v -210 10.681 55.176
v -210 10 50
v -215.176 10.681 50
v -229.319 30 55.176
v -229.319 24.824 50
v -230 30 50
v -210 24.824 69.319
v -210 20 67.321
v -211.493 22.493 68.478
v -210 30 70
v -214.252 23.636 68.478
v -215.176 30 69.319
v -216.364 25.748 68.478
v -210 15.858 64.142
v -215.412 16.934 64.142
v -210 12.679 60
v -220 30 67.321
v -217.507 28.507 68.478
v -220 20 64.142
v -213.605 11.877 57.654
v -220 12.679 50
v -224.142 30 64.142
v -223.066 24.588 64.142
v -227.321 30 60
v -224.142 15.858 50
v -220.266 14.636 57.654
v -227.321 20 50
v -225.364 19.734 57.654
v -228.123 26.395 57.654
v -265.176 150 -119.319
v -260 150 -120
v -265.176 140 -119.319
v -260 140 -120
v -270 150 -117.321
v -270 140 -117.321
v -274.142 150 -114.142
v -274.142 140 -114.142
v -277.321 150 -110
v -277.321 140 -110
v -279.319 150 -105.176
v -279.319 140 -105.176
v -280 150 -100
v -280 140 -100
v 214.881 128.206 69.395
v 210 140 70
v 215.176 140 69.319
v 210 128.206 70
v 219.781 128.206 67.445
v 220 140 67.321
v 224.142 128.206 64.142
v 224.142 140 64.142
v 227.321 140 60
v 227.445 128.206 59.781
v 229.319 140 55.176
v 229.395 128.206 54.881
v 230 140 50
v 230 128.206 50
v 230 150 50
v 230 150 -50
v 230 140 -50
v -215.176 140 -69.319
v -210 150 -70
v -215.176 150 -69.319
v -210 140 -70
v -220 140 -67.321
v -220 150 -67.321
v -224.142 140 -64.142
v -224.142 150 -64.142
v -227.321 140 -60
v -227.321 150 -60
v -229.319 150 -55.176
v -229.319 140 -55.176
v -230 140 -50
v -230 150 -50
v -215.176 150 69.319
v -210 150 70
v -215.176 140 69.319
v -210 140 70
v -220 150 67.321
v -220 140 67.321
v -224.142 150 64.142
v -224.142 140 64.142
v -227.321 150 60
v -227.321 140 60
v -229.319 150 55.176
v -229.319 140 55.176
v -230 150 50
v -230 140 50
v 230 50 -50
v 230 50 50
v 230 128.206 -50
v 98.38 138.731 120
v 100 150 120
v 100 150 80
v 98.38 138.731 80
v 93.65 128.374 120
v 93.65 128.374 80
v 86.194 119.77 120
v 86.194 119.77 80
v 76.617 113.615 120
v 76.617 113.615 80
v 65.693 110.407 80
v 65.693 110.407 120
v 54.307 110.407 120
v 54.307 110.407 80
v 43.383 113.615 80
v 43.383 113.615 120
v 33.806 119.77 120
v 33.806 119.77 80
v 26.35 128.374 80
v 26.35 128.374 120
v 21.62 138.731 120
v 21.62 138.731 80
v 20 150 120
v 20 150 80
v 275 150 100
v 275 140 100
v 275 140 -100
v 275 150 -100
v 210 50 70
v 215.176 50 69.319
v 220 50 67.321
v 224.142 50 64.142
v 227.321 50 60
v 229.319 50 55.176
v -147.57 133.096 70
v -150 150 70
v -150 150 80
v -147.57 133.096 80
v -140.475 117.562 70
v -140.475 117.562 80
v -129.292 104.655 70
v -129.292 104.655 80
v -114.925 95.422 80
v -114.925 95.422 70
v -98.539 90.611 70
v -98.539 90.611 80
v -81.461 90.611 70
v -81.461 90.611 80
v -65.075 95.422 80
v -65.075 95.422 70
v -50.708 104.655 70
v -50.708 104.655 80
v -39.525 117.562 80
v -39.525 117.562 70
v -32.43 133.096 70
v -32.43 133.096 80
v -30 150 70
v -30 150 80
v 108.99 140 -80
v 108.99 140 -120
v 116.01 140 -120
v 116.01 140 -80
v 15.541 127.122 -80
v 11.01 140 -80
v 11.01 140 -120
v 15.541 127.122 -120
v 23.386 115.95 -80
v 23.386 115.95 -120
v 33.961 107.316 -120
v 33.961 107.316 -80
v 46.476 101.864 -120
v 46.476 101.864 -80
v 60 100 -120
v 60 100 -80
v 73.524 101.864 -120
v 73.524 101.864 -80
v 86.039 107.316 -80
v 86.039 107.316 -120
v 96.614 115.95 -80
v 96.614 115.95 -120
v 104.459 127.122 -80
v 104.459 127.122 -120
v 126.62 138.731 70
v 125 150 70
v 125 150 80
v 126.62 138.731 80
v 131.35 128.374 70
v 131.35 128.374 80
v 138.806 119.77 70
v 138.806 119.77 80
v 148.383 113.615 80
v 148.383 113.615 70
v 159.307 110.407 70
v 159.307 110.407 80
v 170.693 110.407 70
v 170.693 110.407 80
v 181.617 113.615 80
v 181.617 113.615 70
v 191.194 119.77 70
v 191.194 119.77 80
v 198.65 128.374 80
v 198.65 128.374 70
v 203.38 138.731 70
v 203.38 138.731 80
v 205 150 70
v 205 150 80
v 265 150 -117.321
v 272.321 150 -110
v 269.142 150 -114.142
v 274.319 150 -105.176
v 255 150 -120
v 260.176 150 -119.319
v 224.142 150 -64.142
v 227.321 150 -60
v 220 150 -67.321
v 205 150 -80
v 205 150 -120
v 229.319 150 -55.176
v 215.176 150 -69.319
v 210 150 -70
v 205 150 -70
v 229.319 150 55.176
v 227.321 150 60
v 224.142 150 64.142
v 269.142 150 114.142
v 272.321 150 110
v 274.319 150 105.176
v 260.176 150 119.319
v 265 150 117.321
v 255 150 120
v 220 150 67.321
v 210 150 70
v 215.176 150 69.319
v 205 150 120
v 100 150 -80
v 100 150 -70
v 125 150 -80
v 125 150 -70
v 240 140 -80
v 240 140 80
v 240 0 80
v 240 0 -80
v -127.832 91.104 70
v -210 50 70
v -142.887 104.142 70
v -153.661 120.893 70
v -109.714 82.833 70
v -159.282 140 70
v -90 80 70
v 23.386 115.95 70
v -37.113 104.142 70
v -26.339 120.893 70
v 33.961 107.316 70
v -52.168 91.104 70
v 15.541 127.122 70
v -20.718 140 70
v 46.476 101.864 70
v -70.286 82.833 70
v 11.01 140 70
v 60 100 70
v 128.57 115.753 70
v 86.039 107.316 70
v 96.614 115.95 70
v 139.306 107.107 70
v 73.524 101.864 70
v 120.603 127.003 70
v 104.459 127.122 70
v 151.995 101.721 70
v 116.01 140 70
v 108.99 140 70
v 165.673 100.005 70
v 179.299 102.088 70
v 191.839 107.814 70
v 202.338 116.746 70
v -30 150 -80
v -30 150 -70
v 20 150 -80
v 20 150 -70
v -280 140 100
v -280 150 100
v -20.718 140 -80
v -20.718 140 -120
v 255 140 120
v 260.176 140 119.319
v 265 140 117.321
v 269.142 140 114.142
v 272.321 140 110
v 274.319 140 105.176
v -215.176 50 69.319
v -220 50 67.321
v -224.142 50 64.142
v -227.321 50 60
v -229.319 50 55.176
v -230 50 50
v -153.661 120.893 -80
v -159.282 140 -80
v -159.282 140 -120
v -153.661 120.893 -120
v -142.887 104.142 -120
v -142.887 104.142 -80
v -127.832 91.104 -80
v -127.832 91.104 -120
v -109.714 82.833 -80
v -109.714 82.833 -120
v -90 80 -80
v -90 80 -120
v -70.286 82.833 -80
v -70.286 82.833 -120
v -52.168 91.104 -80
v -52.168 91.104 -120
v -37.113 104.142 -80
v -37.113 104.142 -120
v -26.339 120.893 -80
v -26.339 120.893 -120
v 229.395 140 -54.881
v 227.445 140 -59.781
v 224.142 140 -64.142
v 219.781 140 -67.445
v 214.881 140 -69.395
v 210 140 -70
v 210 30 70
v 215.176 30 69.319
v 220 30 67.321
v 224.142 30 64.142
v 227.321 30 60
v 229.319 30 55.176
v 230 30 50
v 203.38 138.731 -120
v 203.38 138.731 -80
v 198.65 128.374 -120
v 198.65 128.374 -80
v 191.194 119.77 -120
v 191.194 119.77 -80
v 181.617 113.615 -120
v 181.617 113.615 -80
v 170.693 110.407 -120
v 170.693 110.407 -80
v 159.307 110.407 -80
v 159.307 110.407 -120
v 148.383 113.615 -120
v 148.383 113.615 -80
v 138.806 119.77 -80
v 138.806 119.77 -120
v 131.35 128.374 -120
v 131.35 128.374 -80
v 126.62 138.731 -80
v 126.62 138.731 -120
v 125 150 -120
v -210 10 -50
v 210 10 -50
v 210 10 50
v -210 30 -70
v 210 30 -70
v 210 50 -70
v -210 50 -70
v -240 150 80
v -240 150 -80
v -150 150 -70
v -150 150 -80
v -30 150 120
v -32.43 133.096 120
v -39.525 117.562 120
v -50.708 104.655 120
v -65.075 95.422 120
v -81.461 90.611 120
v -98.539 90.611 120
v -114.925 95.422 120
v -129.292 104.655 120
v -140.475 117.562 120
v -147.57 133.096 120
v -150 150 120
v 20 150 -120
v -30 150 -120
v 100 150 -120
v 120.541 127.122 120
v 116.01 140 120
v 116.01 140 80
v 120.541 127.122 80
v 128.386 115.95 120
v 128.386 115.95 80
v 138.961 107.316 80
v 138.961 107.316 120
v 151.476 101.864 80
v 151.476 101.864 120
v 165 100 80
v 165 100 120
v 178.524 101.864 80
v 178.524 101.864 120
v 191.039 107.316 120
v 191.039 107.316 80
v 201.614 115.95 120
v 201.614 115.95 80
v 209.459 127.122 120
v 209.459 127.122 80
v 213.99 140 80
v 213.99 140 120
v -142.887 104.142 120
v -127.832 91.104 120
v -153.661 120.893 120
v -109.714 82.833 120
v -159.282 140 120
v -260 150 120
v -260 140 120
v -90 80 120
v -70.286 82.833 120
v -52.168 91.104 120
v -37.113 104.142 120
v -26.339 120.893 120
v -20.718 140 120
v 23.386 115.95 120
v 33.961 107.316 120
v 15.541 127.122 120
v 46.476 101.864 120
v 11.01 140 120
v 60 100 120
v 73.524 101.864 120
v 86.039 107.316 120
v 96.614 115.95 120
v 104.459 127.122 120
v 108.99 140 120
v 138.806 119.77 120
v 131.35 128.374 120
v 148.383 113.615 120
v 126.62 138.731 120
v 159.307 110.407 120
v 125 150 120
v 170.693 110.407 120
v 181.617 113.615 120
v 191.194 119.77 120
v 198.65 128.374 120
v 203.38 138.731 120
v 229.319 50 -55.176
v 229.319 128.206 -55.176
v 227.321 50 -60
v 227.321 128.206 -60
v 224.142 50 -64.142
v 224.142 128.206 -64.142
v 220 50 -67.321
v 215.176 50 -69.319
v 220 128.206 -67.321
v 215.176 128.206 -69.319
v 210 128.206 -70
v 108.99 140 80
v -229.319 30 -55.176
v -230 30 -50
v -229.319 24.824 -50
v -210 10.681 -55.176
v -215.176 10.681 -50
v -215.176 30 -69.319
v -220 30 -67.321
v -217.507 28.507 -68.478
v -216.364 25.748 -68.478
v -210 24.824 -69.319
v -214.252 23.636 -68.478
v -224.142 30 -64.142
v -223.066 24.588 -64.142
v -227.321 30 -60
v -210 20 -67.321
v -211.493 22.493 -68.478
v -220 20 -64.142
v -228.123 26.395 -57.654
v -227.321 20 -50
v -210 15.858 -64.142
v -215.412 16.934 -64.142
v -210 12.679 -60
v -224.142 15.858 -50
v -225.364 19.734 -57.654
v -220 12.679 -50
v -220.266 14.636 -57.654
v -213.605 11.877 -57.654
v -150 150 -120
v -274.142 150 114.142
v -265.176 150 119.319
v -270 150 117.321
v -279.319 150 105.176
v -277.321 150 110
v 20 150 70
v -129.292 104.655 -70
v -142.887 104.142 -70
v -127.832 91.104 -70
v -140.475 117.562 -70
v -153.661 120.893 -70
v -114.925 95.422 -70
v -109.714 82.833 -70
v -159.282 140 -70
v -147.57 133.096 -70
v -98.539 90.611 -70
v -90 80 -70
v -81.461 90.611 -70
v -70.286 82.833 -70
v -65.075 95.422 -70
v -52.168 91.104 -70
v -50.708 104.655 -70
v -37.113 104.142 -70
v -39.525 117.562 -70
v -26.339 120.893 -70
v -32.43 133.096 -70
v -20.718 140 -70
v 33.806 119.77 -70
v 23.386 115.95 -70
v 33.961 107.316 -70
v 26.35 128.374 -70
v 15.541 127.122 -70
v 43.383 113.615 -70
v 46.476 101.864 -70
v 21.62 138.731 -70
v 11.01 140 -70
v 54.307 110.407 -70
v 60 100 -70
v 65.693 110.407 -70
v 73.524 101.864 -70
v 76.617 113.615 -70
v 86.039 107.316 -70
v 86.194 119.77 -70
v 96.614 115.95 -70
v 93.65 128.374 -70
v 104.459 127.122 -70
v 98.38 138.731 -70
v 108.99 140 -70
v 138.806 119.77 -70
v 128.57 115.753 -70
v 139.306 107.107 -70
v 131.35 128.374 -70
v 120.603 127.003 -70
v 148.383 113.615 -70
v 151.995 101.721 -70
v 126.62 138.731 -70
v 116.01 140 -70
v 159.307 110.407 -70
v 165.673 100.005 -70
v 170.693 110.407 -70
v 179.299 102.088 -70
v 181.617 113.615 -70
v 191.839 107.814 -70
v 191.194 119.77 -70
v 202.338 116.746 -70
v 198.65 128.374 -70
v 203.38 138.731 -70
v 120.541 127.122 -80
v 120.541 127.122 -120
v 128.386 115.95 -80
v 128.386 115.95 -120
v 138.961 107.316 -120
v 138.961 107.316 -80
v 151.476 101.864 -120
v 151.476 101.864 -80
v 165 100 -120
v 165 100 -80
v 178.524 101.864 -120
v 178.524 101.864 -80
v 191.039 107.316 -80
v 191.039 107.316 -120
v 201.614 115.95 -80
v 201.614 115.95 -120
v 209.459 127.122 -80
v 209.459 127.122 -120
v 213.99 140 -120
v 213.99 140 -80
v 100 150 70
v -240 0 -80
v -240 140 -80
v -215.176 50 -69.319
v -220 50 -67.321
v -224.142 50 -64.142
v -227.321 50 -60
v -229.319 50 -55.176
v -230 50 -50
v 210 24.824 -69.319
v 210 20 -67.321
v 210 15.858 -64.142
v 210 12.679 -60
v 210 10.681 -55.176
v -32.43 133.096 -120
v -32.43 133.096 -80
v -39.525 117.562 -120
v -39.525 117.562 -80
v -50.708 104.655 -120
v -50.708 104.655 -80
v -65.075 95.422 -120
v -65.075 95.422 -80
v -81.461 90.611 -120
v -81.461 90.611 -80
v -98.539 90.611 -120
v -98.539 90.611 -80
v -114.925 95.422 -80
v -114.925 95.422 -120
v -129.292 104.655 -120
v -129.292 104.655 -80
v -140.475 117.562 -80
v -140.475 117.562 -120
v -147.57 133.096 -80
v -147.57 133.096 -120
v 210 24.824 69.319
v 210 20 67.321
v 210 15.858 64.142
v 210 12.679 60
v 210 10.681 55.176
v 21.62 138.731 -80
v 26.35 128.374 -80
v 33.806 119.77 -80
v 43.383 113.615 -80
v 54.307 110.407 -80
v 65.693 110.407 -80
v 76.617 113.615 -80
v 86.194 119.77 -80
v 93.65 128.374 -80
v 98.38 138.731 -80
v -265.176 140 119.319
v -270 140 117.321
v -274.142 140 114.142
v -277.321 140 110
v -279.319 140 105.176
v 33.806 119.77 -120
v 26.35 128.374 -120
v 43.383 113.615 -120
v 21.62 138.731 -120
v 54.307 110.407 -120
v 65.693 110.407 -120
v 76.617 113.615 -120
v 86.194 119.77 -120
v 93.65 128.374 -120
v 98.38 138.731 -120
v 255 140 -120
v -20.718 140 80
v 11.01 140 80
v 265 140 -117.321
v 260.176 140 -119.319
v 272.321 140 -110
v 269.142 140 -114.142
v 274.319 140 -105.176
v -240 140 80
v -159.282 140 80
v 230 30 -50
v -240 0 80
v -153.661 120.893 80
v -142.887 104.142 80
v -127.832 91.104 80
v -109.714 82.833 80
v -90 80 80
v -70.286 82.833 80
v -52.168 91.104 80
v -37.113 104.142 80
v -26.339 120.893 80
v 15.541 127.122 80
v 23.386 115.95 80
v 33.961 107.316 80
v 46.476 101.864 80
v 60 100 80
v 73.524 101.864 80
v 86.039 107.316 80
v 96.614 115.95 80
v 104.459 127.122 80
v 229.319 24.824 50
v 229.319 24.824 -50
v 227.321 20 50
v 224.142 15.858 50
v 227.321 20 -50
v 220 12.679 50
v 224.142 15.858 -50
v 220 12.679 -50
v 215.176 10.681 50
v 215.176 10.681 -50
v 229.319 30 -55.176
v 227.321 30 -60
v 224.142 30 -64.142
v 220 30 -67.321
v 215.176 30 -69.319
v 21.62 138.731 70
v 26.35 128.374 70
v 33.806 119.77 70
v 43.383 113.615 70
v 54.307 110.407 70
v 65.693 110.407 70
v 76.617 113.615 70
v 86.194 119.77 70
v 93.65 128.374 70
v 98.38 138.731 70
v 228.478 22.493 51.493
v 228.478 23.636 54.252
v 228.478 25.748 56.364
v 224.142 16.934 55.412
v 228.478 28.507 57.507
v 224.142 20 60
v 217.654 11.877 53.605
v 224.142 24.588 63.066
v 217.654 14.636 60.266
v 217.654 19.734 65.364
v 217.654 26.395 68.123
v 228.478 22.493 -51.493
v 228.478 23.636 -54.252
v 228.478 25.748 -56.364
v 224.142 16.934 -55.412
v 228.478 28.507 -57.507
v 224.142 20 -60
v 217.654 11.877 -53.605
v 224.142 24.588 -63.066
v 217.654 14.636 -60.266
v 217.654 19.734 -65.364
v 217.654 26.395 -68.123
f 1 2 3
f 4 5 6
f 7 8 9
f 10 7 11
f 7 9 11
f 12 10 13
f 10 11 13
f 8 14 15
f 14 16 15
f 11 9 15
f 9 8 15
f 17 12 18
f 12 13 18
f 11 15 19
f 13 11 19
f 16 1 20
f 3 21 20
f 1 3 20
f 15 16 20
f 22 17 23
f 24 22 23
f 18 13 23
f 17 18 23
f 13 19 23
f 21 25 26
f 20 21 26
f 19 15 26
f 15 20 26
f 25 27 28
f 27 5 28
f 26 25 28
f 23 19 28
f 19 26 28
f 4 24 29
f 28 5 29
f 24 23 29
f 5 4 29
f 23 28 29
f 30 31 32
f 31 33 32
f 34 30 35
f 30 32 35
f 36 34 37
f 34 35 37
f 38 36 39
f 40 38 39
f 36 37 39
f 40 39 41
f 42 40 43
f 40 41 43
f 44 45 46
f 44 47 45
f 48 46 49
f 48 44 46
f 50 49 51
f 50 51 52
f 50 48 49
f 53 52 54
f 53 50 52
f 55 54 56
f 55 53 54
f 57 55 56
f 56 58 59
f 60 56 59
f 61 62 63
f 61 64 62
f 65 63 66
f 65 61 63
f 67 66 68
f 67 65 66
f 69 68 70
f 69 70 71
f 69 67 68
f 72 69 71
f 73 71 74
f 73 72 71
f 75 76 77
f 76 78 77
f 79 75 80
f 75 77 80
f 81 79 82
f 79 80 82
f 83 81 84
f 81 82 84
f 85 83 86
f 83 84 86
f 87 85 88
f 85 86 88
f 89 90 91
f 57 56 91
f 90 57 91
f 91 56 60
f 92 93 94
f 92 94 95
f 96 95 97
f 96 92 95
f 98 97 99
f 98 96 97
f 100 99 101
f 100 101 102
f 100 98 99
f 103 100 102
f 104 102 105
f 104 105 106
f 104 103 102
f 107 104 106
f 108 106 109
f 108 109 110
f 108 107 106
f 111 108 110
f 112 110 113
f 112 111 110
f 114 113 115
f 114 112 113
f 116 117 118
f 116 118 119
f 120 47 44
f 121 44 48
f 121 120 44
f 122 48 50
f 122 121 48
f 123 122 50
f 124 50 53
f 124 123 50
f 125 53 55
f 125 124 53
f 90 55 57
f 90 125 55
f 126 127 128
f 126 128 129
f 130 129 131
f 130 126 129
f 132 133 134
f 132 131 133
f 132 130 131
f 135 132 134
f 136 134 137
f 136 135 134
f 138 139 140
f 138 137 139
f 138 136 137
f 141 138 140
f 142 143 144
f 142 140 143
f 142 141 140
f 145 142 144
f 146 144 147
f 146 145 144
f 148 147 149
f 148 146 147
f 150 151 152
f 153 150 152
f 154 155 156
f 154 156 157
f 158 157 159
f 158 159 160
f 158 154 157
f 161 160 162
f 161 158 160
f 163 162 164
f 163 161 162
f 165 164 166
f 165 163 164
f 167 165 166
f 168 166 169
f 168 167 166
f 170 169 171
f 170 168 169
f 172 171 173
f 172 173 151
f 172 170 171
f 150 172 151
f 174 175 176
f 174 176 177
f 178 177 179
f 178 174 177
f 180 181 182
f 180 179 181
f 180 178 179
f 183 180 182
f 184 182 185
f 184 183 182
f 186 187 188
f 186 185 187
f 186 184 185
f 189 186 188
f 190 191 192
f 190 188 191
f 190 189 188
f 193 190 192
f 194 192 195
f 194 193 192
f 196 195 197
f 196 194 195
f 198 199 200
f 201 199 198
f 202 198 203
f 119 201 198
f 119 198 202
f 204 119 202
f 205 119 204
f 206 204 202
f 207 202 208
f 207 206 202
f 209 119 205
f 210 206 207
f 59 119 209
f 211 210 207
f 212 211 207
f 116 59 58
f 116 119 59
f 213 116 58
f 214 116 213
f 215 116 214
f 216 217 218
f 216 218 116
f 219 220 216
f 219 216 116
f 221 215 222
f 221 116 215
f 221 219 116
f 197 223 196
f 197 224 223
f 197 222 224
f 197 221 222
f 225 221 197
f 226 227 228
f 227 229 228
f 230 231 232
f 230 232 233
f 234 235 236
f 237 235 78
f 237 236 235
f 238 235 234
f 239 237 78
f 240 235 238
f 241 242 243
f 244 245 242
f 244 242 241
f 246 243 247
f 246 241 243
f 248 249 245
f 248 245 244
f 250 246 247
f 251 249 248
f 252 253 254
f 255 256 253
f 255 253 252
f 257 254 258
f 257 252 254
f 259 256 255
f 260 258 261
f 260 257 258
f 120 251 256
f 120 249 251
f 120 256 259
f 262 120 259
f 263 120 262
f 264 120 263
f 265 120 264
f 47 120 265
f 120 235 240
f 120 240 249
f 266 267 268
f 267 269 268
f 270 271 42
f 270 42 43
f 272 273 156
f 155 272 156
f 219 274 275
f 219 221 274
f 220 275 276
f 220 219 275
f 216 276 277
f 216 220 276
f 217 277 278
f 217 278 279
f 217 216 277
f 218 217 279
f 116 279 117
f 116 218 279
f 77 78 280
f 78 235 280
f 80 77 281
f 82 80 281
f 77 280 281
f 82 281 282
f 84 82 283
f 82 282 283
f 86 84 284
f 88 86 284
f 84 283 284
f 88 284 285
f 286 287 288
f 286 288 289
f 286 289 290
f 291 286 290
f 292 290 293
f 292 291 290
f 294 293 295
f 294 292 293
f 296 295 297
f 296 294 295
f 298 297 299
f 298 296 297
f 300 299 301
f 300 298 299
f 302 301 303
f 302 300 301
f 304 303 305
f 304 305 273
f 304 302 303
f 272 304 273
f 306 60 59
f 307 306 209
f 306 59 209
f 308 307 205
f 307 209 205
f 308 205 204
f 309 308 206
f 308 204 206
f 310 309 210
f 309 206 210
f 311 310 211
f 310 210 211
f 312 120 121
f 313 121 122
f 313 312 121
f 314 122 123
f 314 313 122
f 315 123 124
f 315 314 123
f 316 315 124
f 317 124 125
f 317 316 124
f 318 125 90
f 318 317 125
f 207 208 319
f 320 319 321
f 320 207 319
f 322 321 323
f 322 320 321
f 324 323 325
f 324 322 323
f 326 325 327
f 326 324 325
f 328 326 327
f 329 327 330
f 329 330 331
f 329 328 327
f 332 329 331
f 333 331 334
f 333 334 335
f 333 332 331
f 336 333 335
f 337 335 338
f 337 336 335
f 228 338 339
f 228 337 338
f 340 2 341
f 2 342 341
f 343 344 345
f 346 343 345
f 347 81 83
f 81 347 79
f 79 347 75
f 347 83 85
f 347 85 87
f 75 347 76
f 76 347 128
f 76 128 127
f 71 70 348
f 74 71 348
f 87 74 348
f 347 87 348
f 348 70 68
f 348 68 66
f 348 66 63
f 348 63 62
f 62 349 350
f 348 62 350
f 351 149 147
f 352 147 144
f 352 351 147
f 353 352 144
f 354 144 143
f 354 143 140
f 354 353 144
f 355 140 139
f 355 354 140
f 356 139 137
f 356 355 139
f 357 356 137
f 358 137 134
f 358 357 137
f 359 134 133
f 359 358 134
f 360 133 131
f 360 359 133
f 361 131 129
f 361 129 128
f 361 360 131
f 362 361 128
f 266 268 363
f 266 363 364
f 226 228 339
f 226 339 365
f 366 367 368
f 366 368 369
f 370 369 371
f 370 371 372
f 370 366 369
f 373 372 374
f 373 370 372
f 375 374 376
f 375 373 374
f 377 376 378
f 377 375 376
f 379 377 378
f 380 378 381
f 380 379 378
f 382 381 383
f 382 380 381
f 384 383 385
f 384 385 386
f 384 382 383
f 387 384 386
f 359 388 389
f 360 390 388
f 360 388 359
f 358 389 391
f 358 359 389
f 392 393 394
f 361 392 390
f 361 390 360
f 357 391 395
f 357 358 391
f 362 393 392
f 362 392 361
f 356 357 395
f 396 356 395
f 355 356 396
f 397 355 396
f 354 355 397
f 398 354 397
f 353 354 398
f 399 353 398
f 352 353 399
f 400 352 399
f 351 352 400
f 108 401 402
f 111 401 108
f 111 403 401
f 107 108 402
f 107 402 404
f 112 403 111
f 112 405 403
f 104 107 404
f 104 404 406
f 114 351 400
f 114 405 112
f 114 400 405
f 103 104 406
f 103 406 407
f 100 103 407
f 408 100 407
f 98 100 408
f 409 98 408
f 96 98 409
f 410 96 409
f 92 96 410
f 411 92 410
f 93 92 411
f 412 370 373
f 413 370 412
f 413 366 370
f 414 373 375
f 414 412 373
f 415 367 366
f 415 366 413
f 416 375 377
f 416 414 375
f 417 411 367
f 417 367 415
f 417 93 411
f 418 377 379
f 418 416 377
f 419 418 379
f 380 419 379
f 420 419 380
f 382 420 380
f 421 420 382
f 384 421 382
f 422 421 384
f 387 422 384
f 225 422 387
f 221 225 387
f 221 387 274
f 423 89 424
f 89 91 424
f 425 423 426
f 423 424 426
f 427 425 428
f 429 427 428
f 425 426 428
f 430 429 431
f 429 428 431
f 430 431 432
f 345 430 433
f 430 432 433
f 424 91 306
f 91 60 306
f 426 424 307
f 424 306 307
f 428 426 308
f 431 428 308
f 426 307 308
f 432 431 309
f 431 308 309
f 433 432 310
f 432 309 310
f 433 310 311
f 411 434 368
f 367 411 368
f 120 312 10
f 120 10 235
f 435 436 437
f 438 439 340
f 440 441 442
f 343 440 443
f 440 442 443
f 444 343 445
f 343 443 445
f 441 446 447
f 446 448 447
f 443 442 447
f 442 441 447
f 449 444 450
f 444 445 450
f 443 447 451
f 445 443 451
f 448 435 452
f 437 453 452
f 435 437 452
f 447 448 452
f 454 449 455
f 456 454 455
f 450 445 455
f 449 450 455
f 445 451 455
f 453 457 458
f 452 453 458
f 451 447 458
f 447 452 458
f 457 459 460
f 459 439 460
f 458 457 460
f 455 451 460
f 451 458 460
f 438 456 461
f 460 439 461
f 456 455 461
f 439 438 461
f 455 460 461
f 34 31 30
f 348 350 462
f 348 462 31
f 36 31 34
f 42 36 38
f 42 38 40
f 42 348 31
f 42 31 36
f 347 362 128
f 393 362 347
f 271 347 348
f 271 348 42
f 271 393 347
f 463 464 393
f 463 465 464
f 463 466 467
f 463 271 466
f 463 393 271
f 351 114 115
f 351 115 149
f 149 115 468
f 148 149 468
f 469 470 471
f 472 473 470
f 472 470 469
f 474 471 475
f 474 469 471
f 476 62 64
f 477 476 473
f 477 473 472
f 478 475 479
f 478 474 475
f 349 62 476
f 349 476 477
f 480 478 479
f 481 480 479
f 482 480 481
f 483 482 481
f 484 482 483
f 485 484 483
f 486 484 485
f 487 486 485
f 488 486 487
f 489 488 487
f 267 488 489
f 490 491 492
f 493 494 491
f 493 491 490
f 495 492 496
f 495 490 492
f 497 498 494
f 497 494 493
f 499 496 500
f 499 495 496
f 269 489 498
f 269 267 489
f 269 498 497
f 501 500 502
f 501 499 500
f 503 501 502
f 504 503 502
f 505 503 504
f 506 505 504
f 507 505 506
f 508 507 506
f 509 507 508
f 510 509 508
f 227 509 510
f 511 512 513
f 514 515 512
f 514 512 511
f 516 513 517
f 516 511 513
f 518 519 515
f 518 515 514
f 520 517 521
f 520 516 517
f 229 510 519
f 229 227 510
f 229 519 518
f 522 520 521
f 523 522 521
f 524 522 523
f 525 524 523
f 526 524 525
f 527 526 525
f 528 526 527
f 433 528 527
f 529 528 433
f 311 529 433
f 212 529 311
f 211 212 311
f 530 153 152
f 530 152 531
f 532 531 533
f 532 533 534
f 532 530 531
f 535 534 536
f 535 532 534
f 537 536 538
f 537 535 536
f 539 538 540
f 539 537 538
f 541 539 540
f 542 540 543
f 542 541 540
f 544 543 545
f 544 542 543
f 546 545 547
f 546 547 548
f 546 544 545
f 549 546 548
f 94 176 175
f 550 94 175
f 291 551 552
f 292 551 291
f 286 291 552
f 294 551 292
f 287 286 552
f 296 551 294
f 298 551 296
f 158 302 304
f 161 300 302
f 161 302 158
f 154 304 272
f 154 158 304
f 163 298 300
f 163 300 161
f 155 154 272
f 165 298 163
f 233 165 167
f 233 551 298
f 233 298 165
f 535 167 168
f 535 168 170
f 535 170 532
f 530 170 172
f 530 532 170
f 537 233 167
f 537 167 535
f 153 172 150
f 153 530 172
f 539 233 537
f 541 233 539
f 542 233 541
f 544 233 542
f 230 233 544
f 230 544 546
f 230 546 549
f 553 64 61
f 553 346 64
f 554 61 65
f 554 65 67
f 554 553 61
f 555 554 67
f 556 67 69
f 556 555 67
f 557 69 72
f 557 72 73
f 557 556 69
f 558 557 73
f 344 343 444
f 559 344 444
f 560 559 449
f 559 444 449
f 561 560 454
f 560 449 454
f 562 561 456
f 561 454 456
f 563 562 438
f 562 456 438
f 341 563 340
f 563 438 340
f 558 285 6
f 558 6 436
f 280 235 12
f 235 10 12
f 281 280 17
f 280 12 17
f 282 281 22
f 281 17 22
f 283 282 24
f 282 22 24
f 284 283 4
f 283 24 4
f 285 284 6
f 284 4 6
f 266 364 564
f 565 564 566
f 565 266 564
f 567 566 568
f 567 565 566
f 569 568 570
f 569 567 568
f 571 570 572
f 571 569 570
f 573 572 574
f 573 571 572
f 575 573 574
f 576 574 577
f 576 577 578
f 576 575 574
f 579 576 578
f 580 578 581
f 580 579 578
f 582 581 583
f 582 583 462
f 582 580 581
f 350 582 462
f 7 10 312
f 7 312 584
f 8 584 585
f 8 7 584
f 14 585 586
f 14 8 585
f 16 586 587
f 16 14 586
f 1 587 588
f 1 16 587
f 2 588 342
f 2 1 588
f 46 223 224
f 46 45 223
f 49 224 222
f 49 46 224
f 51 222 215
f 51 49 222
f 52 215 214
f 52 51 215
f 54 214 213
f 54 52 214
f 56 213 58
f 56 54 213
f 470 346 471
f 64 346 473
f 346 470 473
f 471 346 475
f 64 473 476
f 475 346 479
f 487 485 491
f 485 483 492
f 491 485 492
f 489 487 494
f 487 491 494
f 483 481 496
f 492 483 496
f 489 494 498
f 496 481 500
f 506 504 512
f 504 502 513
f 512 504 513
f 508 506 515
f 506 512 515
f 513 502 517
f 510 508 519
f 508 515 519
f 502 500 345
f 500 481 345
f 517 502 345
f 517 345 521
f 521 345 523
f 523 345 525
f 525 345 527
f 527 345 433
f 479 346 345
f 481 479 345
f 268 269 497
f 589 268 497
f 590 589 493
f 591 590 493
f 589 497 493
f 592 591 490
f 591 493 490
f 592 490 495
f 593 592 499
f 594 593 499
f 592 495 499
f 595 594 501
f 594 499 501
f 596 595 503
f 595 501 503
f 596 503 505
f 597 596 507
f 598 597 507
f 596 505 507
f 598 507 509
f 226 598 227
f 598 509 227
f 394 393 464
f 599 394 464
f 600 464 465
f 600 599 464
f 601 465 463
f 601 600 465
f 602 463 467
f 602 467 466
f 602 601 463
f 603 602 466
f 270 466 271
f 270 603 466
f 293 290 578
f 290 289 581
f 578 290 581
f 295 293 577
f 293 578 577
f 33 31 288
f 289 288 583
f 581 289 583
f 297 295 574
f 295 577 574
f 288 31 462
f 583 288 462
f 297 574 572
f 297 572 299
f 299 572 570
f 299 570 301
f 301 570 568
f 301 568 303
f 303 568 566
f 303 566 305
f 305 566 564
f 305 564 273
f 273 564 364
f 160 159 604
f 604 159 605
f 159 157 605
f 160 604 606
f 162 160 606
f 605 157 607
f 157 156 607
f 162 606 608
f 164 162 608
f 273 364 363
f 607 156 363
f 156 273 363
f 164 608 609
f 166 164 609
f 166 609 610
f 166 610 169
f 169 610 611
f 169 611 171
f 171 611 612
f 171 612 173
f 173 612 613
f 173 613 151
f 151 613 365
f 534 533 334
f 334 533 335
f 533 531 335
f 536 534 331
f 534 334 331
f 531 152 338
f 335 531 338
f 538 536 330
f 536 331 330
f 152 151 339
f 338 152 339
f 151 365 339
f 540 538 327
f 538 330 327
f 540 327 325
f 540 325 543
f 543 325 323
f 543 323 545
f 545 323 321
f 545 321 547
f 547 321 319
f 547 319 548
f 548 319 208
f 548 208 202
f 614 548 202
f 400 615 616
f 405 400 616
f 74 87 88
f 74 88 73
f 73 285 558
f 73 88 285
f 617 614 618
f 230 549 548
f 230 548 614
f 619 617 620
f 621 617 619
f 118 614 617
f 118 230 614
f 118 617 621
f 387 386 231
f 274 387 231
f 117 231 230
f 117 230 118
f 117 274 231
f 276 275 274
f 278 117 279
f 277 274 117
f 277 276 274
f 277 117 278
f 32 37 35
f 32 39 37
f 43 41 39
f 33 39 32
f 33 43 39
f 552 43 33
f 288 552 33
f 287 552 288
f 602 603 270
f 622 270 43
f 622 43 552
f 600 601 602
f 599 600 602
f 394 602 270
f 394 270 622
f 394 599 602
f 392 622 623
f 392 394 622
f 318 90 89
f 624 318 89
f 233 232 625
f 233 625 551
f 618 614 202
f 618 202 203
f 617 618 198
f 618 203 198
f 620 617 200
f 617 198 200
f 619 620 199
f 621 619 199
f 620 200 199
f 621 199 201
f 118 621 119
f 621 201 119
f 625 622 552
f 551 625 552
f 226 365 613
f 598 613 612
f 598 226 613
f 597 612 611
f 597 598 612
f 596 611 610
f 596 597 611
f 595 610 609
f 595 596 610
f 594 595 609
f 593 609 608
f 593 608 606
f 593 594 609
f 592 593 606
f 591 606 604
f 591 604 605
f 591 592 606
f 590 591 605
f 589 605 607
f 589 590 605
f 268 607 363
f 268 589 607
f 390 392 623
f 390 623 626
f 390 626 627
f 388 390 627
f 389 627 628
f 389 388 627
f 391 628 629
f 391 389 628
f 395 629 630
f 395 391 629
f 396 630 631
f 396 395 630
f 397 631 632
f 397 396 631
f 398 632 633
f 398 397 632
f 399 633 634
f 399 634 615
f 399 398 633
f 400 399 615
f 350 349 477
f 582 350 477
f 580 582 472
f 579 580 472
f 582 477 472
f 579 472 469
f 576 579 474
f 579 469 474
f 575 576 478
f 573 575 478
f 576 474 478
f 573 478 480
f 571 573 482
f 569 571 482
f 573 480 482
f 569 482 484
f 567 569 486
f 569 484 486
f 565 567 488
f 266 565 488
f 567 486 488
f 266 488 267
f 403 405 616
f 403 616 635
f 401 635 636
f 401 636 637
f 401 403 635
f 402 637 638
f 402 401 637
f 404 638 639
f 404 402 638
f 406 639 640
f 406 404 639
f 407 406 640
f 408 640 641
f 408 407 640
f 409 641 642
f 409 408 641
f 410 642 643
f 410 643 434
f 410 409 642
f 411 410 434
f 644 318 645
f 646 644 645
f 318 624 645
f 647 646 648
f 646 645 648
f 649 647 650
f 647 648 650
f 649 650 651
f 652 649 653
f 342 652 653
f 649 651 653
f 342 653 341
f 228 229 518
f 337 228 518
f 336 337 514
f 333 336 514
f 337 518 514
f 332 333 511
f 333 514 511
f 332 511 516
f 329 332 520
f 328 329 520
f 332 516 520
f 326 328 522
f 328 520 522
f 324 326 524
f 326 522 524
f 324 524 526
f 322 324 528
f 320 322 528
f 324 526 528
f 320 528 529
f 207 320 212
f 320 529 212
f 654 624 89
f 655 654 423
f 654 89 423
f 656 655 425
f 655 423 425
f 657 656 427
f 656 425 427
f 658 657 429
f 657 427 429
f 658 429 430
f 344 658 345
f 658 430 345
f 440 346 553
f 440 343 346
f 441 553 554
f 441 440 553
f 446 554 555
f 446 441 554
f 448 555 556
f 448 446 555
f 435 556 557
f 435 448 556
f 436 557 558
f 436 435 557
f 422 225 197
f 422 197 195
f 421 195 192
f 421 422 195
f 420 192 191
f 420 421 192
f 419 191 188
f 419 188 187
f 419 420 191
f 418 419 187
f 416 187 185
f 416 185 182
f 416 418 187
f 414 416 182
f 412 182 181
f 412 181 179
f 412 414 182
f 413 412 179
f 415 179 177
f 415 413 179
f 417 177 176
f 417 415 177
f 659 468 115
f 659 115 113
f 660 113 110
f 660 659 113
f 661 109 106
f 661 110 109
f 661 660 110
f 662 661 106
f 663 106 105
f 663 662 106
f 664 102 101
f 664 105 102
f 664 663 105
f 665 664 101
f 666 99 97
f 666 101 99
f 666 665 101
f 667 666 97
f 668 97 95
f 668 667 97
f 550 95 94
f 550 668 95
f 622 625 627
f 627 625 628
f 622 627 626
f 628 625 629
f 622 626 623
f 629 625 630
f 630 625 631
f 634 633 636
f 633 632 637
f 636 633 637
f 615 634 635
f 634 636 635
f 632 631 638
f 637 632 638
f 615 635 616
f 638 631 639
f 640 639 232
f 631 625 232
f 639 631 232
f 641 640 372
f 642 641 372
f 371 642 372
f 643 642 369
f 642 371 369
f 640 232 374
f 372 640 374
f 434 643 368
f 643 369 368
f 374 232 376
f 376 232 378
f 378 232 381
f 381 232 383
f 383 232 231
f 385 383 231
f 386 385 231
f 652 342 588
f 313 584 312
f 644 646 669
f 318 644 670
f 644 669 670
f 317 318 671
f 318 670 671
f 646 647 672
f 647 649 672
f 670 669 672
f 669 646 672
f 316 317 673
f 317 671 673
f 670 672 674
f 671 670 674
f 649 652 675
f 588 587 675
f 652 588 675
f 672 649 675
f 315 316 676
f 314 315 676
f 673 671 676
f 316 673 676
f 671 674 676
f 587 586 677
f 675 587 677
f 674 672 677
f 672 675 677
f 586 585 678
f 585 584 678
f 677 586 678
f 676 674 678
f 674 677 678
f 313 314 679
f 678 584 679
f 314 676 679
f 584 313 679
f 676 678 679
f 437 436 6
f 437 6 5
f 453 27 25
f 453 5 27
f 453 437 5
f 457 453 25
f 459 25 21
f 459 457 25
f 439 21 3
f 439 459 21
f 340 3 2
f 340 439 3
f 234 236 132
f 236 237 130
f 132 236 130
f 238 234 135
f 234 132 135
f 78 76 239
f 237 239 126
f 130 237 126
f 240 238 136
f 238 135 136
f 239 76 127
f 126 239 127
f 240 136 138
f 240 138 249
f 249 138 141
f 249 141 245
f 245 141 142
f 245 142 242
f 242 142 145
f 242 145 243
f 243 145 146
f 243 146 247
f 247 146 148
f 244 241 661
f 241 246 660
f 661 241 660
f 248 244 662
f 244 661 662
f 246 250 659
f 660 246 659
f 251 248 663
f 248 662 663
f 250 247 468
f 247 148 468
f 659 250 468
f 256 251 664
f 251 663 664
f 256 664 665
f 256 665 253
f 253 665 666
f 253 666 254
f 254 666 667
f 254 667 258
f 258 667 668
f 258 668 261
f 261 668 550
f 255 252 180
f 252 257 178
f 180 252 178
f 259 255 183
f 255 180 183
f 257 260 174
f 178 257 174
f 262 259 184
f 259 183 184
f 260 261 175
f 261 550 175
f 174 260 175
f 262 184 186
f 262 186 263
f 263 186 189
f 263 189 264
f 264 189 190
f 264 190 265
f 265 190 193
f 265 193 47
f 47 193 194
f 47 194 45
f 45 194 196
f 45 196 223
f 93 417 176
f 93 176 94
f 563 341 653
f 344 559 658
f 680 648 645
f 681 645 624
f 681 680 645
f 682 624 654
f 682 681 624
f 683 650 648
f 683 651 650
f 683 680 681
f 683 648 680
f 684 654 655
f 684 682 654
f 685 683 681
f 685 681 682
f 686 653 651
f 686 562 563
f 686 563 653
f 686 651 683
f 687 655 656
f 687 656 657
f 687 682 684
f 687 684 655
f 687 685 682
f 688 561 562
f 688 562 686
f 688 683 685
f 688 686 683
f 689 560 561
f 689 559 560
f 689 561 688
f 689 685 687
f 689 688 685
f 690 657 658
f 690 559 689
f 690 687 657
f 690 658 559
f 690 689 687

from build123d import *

# Parameters (mm, degrees)
SKETCH1_W               = 160
SKETCH1_H               = 150
BOSS_EXTRUDE1_DEPTH     = 240
SHELL1_T                = -10
SKETCH2_R               = 60
SKETCH2_R_2             = 40
CUT_EXTRUDE1_DEPTH      = 81
CUT_EXTRUDE1_DEPTH_BACK = 81
EXTRUDE_THIN1_DEPTH     = 120
SKETCH4_W               = 460
SKETCH4_H               = 140
CUT_EXTRUDE2_DEPTH      = 100
FILLET1_R               = 20
FILLET2_R               = 20


with BuildPart() as part:
    # Sketch1 → Boss-Extrude1 (new body, symmetric)
    with BuildSketch(Plane(origin=(0, 0, 0), x_dir=(0, 0, -1), z_dir=(1, 0, 0))):
        with Locations((0, 75)):
            Rectangle(SKETCH1_W, SKETCH1_H)
    extrude(amount=BOSS_EXTRUDE1_DEPTH, both=True)

    # Shell1
    shell1_openings = [part.faces().sort_by_distance(p)[0] for p in [
        (0, 150, 0),
    ]]
    offset(amount=SHELL1_T, openings=shell1_openings, kind=Kind.INTERSECTION)

    # Sketch2 → Cut-Extrude1 (cut, two sides)
    with BuildSketch(Plane.XY) as cut_extrude1_sk:
        with Locations((-90, 150)):
            Circle(SKETCH2_R)
        with Locations((60, 150)):
            Circle(SKETCH2_R_2)
        with Locations((165, 150)):
            Circle(SKETCH2_R_2)
    extrude(amount=CUT_EXTRUDE1_DEPTH, mode=Mode.SUBTRACT)
    extrude(cut_extrude1_sk.sketch, amount=-CUT_EXTRUDE1_DEPTH_BACK, mode=Mode.SUBTRACT)

    # Sketch3 → Extrude-Thin1 (add, symmetric)
    with BuildSketch(Plane.XY):
        with BuildLine():
            Line((275, 150), (205, 150))
            ThreePointArc((205, 150), (165, 110), (125, 150))
            Line((125, 150), (100, 150))
            ThreePointArc((100, 150), (60, 110), (20, 150))
            Line((20, 150), (-30, 150))
            ThreePointArc((-30, 150), (-90, 90), (-150, 150))
            Line((-150, 150), (-280, 150))
            Line((-280, 150), (-280, 140))
            Line((-280, 140), (-159.282032303, 140))
            ThreePointArc((-159.282032303, 140), (-90, 80), (-20.717967697, 140))
            Line((-20.717967697, 140), (11.010205144, 140))
            ThreePointArc((11.010205144, 140), (60, 100), (108.989794856, 140))
            Line((108.989794856, 140), (116.010205144, 140))
            ThreePointArc((116.010205144, 140), (165, 100), (213.989794856, 140))
            Line((213.989794856, 140), (275, 140))
            Line((275, 140), (275, 150))
        make_face()
    extrude(amount=EXTRUDE_THIN1_DEPTH, both=True)

    # Sketch4 → Cut-Extrude2 (cut)
    with BuildSketch(Plane(origin=(0, 150, 0), x_dir=(1, 0, 0), z_dir=(0, 1, 0))):
        Rectangle(SKETCH4_W, SKETCH4_H)
    extrude(amount=-CUT_EXTRUDE2_DEPTH, mode=Mode.SUBTRACT)

    # Fillet1
    fillet1_edges = [part.edges().sort_by_distance(p)[0] for p in [
        (275, 145, 120),
        (-280, 145, 120),
        (-280, 145, -120),
        (275, 145, -120),
    ]]
    fillet(fillet1_edges, radius=FILLET1_R)

    # Fillet2
    fillet2_edges = [part.edges().sort_by_distance(p)[0] for p in [
        (-230, 10, 0),
        (0, 10, 70),
        (-230, 80, -70),
        (0, 10, -70),
        (230, 10, 0),
        (230, 80, -70),
        (-230, 80, 70),
        (230, 80, 70),
    ]]
    fillet(fillet2_edges, radius=FILLET2_R)


solid = part.part
